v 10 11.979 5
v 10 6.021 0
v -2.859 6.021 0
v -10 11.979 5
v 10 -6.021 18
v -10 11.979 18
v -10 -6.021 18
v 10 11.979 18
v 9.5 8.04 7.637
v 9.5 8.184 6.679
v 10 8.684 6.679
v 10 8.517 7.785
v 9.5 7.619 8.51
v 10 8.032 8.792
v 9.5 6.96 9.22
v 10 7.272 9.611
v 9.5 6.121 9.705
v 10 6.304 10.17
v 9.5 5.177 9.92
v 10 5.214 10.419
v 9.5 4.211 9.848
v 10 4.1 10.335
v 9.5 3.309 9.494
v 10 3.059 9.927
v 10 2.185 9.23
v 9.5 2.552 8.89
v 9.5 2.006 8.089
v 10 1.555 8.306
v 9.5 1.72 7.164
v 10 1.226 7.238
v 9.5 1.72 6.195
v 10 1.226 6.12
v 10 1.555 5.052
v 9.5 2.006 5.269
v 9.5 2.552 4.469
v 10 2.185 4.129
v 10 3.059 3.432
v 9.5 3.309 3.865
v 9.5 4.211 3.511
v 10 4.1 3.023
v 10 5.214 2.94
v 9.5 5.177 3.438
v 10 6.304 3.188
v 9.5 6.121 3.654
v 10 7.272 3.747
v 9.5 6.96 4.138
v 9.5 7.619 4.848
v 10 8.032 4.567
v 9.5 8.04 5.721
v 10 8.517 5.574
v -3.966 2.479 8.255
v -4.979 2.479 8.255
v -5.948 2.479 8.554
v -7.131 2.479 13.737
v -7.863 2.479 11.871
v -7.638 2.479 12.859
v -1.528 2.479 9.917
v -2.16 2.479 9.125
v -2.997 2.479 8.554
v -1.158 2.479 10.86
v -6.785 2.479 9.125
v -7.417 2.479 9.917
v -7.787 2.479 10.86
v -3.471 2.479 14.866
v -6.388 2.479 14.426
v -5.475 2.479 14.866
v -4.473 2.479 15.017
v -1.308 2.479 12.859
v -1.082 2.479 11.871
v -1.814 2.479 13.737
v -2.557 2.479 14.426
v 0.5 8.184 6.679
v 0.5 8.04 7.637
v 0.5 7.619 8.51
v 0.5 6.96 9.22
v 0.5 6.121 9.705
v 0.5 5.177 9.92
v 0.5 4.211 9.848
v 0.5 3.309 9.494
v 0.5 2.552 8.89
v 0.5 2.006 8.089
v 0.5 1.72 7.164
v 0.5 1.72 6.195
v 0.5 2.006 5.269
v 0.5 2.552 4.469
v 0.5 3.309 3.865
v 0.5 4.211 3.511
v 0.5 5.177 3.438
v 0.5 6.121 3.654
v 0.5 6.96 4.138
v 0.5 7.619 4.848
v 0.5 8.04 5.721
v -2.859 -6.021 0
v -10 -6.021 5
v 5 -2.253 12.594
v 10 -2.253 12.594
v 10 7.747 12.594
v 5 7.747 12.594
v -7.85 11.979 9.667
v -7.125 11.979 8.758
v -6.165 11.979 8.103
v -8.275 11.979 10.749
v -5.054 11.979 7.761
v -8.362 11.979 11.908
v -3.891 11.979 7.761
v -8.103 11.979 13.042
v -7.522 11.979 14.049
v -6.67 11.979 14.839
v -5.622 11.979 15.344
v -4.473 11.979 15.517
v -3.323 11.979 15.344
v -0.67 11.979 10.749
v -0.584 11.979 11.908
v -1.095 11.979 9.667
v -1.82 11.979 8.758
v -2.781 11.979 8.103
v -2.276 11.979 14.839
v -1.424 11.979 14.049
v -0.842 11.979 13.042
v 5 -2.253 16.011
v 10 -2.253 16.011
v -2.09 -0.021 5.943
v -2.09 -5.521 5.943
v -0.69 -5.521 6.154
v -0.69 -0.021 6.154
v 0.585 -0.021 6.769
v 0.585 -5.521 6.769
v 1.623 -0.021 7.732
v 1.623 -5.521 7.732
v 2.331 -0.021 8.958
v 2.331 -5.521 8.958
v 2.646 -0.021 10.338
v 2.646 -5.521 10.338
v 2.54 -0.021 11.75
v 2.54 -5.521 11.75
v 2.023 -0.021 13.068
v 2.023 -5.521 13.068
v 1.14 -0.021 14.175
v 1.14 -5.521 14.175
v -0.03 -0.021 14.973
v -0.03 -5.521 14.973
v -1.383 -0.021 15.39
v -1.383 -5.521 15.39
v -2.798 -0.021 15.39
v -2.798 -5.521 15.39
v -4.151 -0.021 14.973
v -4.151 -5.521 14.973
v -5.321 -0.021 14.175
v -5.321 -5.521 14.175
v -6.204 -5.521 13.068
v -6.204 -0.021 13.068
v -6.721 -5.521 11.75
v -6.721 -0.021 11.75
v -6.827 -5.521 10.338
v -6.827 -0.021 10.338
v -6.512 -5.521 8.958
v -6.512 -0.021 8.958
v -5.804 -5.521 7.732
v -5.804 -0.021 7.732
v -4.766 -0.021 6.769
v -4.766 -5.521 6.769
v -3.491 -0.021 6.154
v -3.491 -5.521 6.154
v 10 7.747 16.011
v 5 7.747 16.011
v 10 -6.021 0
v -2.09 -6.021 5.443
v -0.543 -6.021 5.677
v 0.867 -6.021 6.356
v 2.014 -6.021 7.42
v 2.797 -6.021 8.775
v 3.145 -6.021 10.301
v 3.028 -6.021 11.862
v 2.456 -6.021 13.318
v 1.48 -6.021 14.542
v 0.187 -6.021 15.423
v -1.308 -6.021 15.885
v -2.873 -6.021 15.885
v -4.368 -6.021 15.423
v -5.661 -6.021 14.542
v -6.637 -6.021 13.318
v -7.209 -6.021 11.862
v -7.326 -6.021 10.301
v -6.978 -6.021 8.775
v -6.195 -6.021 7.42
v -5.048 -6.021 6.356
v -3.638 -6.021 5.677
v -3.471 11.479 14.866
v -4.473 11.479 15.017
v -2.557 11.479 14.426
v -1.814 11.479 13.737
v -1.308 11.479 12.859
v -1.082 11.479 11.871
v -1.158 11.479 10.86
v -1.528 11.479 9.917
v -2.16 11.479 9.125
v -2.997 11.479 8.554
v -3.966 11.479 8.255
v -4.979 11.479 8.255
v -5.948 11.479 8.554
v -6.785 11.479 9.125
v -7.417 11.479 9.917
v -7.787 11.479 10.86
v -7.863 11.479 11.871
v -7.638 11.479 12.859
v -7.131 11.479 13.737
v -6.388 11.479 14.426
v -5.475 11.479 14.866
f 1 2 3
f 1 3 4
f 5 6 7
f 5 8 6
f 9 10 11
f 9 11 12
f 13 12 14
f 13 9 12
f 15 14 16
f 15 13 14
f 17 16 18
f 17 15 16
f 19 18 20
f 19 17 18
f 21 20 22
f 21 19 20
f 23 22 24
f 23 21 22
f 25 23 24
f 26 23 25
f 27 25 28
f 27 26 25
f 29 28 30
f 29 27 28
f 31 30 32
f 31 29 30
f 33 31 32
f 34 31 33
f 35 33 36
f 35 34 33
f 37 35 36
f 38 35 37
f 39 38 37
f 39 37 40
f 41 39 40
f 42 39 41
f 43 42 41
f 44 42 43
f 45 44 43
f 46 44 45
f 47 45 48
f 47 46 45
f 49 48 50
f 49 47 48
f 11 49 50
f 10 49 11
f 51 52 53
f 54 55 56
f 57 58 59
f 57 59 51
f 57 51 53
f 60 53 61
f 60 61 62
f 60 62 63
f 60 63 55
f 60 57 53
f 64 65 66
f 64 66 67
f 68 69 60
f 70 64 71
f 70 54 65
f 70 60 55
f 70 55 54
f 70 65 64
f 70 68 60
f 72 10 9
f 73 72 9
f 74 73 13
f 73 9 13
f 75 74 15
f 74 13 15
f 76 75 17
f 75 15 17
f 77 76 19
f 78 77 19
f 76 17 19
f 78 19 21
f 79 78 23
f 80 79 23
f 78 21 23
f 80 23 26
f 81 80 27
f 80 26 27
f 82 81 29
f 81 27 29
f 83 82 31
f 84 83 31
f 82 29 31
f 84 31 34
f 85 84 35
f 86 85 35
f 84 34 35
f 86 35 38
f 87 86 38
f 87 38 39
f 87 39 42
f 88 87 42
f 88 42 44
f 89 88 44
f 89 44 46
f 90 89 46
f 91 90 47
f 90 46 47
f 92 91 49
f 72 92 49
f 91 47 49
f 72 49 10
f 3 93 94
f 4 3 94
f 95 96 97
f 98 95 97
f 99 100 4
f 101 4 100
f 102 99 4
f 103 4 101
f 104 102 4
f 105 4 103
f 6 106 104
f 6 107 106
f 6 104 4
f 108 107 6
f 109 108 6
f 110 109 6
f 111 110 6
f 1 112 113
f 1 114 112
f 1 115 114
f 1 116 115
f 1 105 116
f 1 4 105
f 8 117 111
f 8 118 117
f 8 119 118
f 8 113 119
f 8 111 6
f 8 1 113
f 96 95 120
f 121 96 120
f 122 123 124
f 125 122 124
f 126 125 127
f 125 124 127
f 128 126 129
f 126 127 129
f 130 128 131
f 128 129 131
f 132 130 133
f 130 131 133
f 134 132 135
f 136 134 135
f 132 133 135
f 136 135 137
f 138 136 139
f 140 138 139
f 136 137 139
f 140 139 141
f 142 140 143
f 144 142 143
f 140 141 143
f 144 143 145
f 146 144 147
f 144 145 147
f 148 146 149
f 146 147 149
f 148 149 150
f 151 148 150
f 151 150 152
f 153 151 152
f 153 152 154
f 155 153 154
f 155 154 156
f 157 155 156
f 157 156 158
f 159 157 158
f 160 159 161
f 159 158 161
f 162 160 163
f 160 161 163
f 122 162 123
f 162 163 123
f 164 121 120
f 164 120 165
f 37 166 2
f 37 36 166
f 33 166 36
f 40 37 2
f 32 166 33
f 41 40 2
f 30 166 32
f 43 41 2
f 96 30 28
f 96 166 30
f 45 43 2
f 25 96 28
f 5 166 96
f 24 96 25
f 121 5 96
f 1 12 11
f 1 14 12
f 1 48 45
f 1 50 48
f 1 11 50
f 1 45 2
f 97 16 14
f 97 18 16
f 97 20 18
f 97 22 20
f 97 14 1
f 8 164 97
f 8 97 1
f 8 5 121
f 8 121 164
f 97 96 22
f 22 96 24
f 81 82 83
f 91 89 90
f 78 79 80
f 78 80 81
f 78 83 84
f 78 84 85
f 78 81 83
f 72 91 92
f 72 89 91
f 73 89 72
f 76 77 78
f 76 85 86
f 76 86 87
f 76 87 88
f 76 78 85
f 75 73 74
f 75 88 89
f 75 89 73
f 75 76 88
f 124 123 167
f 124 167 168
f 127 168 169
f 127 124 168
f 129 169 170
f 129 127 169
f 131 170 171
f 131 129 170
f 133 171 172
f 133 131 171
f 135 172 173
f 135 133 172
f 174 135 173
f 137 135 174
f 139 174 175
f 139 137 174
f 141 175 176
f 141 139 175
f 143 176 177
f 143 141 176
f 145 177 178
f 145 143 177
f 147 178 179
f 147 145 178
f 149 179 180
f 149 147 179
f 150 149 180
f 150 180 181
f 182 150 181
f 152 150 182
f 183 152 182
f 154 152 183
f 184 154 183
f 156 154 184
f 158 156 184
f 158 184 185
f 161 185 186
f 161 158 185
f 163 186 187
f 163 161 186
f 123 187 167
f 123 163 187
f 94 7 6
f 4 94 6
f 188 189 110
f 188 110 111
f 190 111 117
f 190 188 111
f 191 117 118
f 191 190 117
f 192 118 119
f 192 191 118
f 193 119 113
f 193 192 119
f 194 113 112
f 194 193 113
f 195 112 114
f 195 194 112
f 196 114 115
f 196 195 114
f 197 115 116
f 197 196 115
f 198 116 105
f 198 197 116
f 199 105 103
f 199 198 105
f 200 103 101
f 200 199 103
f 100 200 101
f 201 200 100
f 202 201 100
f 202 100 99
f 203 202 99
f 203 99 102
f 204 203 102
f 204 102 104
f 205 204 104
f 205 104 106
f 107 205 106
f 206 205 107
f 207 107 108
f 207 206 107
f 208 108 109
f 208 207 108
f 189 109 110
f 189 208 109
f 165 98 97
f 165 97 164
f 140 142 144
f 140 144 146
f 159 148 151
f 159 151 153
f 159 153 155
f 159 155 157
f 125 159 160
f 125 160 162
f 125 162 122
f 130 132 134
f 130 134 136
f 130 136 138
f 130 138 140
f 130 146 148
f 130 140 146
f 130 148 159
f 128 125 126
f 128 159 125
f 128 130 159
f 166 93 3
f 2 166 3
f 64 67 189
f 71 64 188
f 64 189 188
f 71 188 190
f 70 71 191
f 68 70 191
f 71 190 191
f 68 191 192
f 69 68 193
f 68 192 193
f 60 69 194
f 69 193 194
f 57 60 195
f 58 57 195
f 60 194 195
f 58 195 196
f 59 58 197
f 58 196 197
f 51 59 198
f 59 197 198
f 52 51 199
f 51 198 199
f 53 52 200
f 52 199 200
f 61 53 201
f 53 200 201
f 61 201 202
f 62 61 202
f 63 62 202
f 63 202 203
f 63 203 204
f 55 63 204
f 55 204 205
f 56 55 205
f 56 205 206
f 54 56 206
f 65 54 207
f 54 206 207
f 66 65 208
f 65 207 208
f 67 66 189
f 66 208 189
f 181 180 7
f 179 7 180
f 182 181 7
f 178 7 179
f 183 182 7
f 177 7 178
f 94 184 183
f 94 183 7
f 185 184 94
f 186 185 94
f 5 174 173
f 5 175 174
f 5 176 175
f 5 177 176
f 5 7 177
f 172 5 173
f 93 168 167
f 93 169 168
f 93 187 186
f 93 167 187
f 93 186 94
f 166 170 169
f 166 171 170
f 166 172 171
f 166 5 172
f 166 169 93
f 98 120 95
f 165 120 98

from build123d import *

# Parameters (mm, degrees)
PAD017_DEPTH    = 10
POCKET021_DEPTH = 12.5
SKETCH043_R     = 3.4
POCKET022_DEPTH = 9.5
SKETCH042_R     = 4.75
POCKET023_DEPTH = 6
SKETCH044_R     = 3.25
POCKET024_DEPTH = 9.5
CHAMFER003_SIZE = 0.5
SKETCH045_W     = 10
SKETCH045_H     = 3.416477
POCKET025_DEPTH = 5


with BuildPart() as part:
    # Sketch040 → Pad017 (new body, symmetric)
    with BuildSketch(Plane.YZ):
        Polygon((-6.020616, 5), (-6.020616, 0), (6.020616, 0), (11.979384, 5), (11.979384, 18), (-6.020616, 18), align=None)
    extrude(amount=PAD017_DEPTH, both=True)

    # Sketch041 → Pocket021 (cut, symmetric)
    with BuildSketch(Plane.XZ):
        Polygon((-2.85926, 0), (-10, 5), (-10, 0), align=None)
    extrude(amount=POCKET021_DEPTH, both=True, mode=Mode.SUBTRACT)

    # Sketch043 (on Face7 of Pocket021) → Pocket022 (cut)
    with BuildSketch(Plane.ZX.offset(11.979384)):
        with Locations((11.617009, -4.472668)):
            Circle(SKETCH043_R)
    extrude(amount=-POCKET022_DEPTH, mode=Mode.SUBTRACT)

    # Sketch042 (on Face5 of Pocket021) → Pocket023 (cut)
    with BuildSketch(Plane(origin=(0, -6.020616, 0), x_dir=(0, 0, -1), z_dir=(0, -1, 0))):
        with Locations((-10.693305, -2.090455)):
            Circle(SKETCH042_R)
    extrude(amount=-POCKET023_DEPTH, mode=Mode.SUBTRACT)

    # Sketch044 (on Face4 of Pocket023) → Pocket024 (cut)
    with BuildSketch(Plane.YZ.offset(10)):
        with Locations((4.93403, 6.679259)):
            Circle(SKETCH044_R)
    extrude(amount=-POCKET024_DEPTH, mode=Mode.SUBTRACT)

    # Chamfer003
    chamfer003_edges = [part.edges().sort_by_distance(p)[0] for p in [
        (-4.472668, 11.979384, 8.217009),
        (10, 1.68403, 6.679259),
        (-2.090455, -6.020616, 15.443305),
    ]]
    chamfer(chamfer003_edges, length=CHAMFER003_SIZE)

    # Sketch045 (on Face1 of Chamfer003) → Pocket025 (cut)
    with BuildSketch(Plane.YZ.offset(10)):
        with Locations((2.746655, 14.302369)):
            Rectangle(SKETCH045_W, SKETCH045_H)
    extrude(amount=-POCKET025_DEPTH, mode=Mode.SUBTRACT)


solid = part.part
